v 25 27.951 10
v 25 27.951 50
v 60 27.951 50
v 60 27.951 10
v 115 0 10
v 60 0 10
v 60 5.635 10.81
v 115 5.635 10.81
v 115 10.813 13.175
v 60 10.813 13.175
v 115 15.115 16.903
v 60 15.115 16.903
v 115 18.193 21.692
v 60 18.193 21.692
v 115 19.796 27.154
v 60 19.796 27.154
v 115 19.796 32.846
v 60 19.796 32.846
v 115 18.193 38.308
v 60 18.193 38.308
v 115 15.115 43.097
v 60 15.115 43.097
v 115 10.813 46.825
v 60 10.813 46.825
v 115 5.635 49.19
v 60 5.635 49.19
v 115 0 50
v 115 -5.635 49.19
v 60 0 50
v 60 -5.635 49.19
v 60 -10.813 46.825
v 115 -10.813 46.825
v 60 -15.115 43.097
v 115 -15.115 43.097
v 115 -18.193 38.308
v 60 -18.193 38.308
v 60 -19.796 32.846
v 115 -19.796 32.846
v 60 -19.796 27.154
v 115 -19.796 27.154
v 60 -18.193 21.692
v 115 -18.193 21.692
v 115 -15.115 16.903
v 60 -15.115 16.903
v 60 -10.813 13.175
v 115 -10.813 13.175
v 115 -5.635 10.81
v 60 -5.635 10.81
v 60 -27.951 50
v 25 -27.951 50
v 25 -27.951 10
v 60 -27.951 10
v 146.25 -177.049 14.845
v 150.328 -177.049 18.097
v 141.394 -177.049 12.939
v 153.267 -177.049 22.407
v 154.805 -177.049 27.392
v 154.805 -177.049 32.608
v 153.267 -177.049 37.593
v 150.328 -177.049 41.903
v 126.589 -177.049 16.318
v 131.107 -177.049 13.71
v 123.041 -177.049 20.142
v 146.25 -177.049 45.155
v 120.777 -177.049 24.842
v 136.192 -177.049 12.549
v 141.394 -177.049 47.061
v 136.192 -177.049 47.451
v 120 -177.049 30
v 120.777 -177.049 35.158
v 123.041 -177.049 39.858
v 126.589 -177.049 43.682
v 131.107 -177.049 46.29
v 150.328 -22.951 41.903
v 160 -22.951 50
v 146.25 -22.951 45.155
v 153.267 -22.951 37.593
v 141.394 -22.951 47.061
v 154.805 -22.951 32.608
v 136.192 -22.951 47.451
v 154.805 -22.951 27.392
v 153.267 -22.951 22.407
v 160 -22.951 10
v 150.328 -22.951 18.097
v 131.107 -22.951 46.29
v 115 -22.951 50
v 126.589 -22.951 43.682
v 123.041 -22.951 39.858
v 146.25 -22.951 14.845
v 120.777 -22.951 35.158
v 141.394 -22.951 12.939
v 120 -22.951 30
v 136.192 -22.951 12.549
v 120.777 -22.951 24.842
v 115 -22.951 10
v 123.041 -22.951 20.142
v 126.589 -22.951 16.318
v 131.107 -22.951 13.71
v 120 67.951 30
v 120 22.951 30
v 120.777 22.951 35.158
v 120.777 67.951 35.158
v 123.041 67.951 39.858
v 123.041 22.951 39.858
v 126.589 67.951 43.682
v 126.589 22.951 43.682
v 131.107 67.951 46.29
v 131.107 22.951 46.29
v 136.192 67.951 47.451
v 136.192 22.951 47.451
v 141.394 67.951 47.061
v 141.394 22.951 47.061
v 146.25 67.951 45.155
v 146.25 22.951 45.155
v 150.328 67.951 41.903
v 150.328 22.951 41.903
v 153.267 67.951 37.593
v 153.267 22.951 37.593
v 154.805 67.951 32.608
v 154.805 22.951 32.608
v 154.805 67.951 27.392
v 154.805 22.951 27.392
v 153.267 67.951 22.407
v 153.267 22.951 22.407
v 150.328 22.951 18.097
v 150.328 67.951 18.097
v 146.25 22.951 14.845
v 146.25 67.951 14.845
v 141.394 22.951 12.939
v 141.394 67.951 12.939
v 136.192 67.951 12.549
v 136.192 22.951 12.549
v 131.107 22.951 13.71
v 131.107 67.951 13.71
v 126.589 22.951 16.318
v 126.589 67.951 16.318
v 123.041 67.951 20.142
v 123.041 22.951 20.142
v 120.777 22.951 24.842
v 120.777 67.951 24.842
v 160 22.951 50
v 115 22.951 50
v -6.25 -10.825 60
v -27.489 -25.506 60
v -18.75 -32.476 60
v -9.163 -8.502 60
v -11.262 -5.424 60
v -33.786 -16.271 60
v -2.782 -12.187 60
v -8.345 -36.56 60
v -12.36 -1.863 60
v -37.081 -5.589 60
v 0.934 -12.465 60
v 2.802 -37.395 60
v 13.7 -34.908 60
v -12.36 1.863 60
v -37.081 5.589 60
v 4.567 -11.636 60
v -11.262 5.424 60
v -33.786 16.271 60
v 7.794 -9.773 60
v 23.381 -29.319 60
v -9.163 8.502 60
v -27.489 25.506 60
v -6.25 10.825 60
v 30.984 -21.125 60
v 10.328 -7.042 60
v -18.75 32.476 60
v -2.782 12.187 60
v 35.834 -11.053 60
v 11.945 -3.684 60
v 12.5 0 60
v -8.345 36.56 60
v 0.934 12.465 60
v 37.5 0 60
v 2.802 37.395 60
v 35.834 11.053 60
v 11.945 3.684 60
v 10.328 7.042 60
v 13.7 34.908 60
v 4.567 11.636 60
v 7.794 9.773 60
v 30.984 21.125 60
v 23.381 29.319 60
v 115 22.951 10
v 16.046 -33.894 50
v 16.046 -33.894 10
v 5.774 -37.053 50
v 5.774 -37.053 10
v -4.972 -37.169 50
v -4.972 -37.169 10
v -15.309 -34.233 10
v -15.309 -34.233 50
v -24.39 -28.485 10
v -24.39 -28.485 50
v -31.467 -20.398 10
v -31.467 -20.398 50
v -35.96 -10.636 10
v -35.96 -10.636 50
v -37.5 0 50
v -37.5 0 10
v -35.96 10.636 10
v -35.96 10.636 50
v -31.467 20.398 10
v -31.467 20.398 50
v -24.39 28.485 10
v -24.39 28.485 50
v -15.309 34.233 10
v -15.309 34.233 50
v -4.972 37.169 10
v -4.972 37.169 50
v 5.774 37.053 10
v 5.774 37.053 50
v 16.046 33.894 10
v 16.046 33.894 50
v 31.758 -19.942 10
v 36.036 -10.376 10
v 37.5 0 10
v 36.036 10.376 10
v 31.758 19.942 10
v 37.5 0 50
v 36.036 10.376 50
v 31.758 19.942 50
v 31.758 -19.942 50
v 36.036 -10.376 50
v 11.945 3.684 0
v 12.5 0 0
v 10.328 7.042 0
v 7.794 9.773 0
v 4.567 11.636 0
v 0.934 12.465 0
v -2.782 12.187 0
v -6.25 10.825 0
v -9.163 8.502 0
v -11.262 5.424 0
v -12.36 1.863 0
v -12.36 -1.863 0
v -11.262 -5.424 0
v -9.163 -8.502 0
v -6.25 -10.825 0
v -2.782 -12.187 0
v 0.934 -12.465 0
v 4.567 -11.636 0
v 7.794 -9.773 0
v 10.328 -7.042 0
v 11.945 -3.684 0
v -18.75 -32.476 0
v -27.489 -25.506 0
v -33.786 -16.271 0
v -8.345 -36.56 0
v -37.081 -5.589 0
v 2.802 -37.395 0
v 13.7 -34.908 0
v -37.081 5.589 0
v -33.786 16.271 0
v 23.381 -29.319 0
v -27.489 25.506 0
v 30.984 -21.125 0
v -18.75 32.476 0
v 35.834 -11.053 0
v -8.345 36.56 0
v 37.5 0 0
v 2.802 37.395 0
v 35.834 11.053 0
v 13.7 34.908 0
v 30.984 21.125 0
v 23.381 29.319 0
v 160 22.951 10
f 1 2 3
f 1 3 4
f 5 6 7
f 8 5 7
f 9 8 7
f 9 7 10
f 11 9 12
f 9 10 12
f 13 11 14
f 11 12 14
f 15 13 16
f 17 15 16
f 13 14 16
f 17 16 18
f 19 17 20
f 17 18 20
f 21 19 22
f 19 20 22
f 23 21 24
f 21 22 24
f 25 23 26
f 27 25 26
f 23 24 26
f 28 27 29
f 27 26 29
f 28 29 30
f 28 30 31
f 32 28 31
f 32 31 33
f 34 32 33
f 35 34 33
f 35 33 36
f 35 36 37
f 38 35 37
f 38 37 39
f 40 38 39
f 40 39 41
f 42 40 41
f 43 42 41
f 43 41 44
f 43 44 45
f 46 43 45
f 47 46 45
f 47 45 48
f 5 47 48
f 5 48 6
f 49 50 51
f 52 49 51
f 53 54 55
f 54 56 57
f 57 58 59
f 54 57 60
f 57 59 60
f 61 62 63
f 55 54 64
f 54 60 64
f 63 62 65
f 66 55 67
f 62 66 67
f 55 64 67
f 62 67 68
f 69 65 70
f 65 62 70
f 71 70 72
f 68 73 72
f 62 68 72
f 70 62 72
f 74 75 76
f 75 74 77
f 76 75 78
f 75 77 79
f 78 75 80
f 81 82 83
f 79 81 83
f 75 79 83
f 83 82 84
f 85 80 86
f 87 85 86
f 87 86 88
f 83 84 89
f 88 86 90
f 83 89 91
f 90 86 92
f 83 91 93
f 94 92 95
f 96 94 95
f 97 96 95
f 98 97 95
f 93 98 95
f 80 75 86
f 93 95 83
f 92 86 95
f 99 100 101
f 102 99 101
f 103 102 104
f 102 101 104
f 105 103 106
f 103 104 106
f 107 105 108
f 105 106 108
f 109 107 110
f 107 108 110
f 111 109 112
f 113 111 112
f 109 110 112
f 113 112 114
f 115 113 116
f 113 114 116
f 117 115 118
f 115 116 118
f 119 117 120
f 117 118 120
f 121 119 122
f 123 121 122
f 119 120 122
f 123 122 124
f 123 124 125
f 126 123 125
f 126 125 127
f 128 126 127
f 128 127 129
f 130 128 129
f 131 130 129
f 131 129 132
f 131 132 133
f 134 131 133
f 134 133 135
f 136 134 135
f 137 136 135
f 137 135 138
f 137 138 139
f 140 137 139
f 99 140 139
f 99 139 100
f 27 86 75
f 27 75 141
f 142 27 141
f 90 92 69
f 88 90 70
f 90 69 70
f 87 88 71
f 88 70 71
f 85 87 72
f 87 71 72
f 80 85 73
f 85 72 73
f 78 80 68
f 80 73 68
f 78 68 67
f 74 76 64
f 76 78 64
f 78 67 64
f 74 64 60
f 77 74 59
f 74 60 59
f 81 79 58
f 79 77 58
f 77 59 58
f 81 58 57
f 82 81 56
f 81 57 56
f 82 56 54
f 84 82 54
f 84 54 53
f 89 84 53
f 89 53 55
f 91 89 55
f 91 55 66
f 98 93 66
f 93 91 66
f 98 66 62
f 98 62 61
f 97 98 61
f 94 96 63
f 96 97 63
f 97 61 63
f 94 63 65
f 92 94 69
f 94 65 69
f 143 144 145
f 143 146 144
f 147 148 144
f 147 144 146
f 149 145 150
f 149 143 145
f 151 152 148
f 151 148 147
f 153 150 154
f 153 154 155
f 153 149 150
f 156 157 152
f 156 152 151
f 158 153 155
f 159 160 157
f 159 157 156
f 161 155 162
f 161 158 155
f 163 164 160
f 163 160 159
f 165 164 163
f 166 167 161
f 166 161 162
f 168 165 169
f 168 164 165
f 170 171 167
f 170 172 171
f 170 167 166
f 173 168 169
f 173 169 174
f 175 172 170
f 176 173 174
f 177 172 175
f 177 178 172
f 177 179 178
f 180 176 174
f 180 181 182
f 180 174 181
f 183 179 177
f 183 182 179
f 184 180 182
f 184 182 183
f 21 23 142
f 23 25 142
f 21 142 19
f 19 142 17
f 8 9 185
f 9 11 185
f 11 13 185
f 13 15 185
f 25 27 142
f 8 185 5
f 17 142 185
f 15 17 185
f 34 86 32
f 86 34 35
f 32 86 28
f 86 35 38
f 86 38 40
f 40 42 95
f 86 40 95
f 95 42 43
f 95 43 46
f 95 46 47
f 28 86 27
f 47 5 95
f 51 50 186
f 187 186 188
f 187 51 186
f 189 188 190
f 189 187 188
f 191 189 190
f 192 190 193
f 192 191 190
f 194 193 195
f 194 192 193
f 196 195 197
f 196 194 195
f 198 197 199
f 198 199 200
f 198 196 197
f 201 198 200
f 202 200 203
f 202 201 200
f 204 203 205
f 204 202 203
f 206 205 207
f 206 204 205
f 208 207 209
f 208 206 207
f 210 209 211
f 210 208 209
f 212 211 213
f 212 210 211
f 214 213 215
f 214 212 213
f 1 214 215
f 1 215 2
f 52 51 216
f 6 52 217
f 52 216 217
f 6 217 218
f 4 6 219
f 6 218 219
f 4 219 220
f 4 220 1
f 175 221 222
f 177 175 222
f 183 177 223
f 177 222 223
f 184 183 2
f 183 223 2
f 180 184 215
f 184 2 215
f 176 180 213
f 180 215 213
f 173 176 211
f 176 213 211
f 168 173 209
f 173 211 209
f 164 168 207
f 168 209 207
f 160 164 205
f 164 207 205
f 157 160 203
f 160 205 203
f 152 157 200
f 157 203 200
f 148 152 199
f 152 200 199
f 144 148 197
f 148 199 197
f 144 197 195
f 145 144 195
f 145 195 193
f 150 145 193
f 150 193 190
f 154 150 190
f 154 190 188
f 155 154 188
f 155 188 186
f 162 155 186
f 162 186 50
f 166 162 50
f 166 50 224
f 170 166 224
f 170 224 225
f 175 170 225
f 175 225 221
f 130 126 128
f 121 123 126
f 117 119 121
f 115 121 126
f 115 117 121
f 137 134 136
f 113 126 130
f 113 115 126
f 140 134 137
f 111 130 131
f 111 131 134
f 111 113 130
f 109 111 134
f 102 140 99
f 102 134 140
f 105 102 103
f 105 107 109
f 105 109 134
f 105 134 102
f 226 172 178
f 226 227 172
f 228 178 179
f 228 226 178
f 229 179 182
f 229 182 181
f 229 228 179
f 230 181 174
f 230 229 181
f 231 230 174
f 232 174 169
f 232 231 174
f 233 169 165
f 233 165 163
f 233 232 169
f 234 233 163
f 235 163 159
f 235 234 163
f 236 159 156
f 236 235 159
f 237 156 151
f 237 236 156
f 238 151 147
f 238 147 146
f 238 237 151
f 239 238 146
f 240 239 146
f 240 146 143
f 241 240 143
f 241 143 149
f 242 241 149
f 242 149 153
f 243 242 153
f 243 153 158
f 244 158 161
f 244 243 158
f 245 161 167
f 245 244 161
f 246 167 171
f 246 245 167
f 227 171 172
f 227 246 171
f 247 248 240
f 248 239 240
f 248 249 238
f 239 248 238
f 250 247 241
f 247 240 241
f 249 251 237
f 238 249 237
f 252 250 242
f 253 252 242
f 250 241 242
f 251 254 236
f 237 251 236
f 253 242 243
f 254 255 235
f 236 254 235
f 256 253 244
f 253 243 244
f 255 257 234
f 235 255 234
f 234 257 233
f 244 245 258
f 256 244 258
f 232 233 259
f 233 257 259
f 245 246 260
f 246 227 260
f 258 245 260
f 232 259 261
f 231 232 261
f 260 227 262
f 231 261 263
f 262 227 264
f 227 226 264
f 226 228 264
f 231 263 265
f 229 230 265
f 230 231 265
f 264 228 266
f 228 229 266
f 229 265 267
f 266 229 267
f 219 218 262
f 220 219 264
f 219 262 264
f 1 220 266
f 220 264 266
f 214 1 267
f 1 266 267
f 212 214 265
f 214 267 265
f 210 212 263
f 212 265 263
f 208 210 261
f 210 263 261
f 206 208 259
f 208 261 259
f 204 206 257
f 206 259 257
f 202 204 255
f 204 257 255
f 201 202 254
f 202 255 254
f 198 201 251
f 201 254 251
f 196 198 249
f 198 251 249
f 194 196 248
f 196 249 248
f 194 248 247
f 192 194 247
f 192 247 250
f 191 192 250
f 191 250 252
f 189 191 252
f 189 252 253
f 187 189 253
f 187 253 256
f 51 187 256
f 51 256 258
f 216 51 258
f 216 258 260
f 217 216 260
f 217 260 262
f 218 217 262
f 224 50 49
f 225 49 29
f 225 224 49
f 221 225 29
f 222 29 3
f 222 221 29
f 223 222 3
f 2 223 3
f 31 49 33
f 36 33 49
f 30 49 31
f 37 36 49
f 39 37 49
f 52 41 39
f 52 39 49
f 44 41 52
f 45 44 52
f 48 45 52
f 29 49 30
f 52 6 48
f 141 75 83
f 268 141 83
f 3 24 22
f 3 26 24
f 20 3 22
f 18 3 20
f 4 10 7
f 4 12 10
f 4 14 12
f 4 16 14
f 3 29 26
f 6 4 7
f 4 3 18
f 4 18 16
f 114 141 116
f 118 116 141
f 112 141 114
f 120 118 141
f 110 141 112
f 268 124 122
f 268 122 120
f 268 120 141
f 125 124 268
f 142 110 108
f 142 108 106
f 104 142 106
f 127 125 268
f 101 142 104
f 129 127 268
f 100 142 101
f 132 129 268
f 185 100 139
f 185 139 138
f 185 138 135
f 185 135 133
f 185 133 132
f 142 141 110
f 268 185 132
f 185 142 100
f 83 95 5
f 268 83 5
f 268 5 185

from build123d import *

# Parameters (mm, degrees)
SKETCH1_R                = 37.5
SKETCH1_R_2              = 12.5
BOSS_EXTRUDE1_DEPTH      = 10
SKETCH2_R                = 12.5
BOSS_EXTRUDE2_DEPTH      = 40
SKETCH3_R                = 37.5
SKETCH3_R_2              = 12.5
BOSS_EXTRUDE3_DEPTH      = 10
SKETCH4_W                = 40
SKETCH4_H                = 55.901699438
BOSS_EXTRUDE4_DEPTH      = 35
SKETCH5_R                = 20
BOSS_EXTRUDE5_DEPTH      = 55
SKETCH6_W                = 40
SKETCH6_H                = 45.901699438
BOSS_EXTRUDE6_DEPTH      = 45
BOSS_EXTRUDE7_DEPTH      = 45
BOSS_EXTRUDE7_DEPTH_BACK = 200
SKETCH7_R                = 17.5


with BuildPart() as part:
    # Sketch1 → Boss-Extrude1 (new body)
    with BuildSketch(Plane.XY):
        Circle(SKETCH1_R)
        Circle(SKETCH1_R_2, mode=Mode.SUBTRACT)
    extrude(amount=BOSS_EXTRUDE1_DEPTH)

    # Sketch2 → Boss-Extrude2 (add)
    with BuildSketch(Plane.XY.offset(10)):
        with BuildLine():
            Line((25, 27.950849719), (25, -27.950849719))
            ThreePointArc((25, -27.950849719), (-37.5, 0), (25, 27.950849719))
        make_face()
        Circle(SKETCH2_R, mode=Mode.SUBTRACT)
    extrude(amount=BOSS_EXTRUDE2_DEPTH)

    # Sketch3 → Boss-Extrude3 (add)
    with BuildSketch(Plane.XY.offset(50)):
        Circle(SKETCH3_R)
        Circle(SKETCH3_R_2, mode=Mode.SUBTRACT)
    extrude(amount=BOSS_EXTRUDE3_DEPTH)

    # Sketch4 → Boss-Extrude4 (add)
    with BuildSketch(Plane(origin=(25, 0, 0), x_dir=(0, 0, -1), z_dir=(1, 0, 0))):
        with Locations((-30, 0)):
            Rectangle(SKETCH4_W, SKETCH4_H)
    extrude(amount=BOSS_EXTRUDE4_DEPTH)

    # Sketch5 → Boss-Extrude5 (add)
    with BuildSketch(Plane(origin=(60, 0, 0), x_dir=(0, 0, -1), z_dir=(1, 0, 0))):
        with Locations((-30, 0)):
            Circle(SKETCH5_R)
    extrude(amount=BOSS_EXTRUDE5_DEPTH)

    # Sketch6 → Boss-Extrude6 (add)
    with BuildSketch(Plane(origin=(115, 0, 0), x_dir=(0, 0, -1), z_dir=(1, 0, 0))):
        with Locations((-30, 0)):
            Rectangle(SKETCH6_W, SKETCH6_H)
    extrude(amount=BOSS_EXTRUDE6_DEPTH)

    # Sketch7 → Boss-Extrude7 (add, two sides: drawn at the far end of the back side and taken through both)
    with BuildSketch(Plane(origin=(0, 22.950849719, 0), x_dir=(1, 0, 0), z_dir=(0, 1, 0)).offset(-BOSS_EXTRUDE7_DEPTH_BACK)):
        with Locations(Location((137.5, -30, 0), (0, 0, 180))):
            Circle(SKETCH7_R)
    extrude(amount=BOSS_EXTRUDE7_DEPTH + BOSS_EXTRUDE7_DEPTH_BACK)


solid = part.part
